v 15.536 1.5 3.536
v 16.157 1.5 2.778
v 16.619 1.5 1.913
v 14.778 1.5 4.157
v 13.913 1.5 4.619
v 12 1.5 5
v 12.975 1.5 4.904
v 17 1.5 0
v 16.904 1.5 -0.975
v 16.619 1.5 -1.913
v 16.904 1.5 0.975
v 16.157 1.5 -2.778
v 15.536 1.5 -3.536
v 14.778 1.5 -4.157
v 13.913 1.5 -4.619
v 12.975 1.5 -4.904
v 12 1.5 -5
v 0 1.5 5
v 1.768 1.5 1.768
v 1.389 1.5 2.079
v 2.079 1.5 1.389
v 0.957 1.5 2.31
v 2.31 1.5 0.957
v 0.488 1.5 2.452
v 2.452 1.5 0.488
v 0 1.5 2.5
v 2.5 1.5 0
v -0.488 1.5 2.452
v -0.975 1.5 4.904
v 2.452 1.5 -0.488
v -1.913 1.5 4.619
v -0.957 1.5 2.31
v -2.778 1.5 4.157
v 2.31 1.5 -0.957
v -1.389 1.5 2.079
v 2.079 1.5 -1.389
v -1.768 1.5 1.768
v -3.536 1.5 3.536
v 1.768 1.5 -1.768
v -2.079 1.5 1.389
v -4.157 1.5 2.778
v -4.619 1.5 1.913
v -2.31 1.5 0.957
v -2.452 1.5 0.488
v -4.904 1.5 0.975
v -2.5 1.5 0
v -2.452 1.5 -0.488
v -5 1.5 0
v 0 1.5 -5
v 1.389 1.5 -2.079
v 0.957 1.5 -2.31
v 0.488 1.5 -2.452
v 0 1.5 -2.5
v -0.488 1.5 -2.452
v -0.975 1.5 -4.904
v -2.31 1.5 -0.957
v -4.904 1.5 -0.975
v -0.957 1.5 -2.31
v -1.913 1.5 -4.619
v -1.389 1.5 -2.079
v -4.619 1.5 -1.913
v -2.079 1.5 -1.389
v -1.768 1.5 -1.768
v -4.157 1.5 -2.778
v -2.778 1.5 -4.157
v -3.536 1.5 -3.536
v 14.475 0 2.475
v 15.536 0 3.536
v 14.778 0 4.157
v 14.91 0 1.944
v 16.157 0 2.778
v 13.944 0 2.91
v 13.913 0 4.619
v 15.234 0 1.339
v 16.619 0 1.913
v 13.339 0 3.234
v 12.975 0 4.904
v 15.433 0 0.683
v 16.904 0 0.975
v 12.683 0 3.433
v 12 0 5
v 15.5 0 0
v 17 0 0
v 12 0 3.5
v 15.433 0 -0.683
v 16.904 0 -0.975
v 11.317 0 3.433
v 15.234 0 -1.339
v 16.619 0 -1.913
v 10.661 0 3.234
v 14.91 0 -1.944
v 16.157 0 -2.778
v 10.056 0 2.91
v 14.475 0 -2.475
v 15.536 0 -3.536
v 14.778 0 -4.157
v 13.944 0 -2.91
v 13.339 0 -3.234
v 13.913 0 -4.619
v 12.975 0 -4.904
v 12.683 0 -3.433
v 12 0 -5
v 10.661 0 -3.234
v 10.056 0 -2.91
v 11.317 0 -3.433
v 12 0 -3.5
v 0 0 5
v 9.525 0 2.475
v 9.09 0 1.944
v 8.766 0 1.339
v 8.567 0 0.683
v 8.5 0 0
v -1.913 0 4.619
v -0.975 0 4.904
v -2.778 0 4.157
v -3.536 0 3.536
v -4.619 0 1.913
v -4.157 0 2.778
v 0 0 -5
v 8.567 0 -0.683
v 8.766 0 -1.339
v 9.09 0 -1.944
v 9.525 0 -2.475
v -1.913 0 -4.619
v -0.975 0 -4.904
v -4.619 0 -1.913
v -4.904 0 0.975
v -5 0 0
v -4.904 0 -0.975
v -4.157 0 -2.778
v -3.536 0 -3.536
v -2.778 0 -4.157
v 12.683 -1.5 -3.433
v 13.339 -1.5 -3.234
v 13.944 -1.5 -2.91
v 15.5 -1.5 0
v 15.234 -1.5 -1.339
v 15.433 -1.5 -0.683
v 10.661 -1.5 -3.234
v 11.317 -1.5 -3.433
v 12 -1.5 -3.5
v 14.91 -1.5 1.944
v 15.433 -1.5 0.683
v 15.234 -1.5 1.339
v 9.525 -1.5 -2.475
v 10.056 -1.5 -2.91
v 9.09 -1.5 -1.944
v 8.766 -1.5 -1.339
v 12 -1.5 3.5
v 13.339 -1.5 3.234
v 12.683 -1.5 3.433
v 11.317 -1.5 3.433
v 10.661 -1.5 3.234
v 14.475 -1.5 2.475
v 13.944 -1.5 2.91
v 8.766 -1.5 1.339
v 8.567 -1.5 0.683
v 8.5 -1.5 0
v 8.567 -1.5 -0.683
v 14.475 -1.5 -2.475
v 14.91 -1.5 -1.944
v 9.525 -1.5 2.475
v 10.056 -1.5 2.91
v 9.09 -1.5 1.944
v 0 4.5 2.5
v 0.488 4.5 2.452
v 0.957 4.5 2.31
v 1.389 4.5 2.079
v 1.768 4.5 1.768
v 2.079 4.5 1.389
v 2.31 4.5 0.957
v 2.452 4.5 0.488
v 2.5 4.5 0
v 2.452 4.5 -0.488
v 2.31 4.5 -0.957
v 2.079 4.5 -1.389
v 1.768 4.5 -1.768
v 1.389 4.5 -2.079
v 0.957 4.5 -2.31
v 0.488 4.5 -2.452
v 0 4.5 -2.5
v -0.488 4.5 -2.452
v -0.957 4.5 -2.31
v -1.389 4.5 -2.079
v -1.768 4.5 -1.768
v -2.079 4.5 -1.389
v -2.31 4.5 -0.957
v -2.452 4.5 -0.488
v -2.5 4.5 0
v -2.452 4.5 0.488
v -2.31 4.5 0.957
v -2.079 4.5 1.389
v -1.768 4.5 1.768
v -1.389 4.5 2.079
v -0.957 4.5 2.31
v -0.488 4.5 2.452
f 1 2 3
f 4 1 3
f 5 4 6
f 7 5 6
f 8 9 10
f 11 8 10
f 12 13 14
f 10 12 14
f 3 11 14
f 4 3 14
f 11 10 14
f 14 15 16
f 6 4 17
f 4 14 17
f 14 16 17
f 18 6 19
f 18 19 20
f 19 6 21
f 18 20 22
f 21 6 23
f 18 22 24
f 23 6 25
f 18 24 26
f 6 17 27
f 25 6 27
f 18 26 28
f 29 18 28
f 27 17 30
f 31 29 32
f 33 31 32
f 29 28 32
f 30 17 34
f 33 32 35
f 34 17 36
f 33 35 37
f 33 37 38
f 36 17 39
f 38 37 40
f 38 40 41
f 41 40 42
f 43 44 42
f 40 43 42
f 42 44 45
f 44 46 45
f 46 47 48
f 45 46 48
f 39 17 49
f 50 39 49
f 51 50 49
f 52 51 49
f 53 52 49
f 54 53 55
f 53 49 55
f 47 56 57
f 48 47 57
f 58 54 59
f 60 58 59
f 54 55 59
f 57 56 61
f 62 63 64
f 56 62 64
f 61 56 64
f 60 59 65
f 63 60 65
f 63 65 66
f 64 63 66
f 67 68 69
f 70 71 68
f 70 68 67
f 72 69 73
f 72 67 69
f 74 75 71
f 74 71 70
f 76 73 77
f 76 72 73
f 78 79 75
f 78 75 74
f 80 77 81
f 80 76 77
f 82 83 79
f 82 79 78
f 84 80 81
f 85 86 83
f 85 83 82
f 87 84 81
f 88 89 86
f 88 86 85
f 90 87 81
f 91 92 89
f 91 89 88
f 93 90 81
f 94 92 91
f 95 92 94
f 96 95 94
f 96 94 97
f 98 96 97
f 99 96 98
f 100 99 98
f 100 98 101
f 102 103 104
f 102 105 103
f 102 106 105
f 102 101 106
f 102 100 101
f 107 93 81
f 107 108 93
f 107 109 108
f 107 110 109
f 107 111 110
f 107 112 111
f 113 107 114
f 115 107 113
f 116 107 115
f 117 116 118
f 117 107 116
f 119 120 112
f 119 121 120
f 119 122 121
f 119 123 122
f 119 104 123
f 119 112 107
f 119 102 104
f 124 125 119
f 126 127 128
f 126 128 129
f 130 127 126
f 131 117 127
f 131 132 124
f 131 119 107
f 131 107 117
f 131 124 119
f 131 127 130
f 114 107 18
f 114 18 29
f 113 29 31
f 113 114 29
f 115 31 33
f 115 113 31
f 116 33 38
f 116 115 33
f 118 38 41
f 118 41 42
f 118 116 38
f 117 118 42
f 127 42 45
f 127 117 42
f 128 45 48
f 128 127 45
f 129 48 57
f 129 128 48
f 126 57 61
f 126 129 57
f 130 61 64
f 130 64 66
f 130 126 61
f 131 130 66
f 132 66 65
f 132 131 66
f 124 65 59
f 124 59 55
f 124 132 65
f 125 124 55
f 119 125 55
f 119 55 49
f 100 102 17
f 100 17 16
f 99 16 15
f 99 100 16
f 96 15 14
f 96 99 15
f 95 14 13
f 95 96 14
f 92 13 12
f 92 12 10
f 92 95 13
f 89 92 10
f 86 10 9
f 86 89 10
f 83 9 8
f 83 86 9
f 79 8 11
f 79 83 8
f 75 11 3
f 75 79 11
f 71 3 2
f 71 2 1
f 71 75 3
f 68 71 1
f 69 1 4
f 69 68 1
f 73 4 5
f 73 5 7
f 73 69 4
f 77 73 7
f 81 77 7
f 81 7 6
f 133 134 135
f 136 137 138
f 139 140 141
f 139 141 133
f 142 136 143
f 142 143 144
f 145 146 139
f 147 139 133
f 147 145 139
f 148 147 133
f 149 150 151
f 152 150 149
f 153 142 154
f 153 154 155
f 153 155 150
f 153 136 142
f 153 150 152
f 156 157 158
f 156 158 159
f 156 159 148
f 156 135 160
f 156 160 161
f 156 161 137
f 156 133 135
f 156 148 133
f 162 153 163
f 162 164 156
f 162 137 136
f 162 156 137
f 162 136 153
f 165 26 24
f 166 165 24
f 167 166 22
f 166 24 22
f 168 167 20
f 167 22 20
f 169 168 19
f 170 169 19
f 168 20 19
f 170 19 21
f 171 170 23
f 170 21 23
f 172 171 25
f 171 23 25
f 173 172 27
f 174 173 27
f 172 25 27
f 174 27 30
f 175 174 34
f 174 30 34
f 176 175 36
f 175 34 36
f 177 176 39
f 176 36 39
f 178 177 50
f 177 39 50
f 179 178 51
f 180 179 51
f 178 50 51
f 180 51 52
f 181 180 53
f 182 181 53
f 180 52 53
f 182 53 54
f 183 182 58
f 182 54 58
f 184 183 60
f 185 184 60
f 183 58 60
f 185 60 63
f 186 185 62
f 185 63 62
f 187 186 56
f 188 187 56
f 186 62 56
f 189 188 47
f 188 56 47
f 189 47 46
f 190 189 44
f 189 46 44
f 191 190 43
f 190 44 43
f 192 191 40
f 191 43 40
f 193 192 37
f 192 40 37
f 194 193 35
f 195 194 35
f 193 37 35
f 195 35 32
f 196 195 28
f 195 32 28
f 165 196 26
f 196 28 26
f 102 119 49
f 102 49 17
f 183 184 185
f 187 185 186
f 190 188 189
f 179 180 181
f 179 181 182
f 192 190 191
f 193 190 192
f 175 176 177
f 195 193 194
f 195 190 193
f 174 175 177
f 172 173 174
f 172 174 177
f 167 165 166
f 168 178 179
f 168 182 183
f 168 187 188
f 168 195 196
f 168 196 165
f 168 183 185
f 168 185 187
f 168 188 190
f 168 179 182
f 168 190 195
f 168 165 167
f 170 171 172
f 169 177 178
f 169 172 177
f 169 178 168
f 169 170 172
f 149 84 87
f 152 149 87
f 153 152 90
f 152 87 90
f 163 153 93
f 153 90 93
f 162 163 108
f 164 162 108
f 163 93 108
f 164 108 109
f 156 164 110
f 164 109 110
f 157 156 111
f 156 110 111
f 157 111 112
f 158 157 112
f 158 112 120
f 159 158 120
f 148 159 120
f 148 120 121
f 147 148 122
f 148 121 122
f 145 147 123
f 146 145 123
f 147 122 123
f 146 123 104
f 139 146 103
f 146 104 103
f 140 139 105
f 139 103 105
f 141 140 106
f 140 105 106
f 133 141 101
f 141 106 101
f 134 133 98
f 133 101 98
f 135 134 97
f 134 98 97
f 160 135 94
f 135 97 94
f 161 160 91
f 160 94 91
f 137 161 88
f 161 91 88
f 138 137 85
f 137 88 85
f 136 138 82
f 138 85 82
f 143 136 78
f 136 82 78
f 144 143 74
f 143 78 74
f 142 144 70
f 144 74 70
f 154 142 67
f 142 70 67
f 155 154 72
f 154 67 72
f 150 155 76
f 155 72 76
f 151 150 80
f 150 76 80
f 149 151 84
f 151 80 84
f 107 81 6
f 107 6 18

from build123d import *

# Parameters (mm, degrees)
EXTRUDE_1_DEPTH = 1.5
SKETCH_2_R      = 3.5
EXTRUDE_2_DEPTH = 1.5
SKETCH_3_R      = 2.5
EXTRUDE_3_DEPTH = 3


with BuildPart() as part:
    # 草图1 → 凸台-拉伸1 (new body)
    with BuildSketch(Plane(origin=(0, 0, 0), x_dir=(1, 0, 0), z_dir=(0, 1, 0))):
        with BuildLine():
            Line((0, 5), (12, 5))
            ThreePointArc((12, 5), (17, 0), (12, -5))
            Line((12, -5), (0, -5))
            ThreePointArc((0, -5), (-5, 0), (0, 5))
        make_face()
    extrude(amount=EXTRUDE_1_DEPTH)

    # 草图2 → 凸台-拉伸2 (add)
    with BuildSketch(Plane.XZ):
        with Locations(Location((12, 0, 0), (0, 0, 90))):
            Circle(SKETCH_2_R)
    extrude(amount=EXTRUDE_2_DEPTH)

    # 草图3 → 凸台-拉伸3 (add)
    with BuildSketch(Plane(origin=(0, 1.5, 0), x_dir=(1, 0, 0), z_dir=(0, 1, 0))):
        with Locations(Location((0, 0, 0), (0, 0, 270))):
            Circle(SKETCH_3_R)
    extrude(amount=EXTRUDE_3_DEPTH)


solid = part.part
